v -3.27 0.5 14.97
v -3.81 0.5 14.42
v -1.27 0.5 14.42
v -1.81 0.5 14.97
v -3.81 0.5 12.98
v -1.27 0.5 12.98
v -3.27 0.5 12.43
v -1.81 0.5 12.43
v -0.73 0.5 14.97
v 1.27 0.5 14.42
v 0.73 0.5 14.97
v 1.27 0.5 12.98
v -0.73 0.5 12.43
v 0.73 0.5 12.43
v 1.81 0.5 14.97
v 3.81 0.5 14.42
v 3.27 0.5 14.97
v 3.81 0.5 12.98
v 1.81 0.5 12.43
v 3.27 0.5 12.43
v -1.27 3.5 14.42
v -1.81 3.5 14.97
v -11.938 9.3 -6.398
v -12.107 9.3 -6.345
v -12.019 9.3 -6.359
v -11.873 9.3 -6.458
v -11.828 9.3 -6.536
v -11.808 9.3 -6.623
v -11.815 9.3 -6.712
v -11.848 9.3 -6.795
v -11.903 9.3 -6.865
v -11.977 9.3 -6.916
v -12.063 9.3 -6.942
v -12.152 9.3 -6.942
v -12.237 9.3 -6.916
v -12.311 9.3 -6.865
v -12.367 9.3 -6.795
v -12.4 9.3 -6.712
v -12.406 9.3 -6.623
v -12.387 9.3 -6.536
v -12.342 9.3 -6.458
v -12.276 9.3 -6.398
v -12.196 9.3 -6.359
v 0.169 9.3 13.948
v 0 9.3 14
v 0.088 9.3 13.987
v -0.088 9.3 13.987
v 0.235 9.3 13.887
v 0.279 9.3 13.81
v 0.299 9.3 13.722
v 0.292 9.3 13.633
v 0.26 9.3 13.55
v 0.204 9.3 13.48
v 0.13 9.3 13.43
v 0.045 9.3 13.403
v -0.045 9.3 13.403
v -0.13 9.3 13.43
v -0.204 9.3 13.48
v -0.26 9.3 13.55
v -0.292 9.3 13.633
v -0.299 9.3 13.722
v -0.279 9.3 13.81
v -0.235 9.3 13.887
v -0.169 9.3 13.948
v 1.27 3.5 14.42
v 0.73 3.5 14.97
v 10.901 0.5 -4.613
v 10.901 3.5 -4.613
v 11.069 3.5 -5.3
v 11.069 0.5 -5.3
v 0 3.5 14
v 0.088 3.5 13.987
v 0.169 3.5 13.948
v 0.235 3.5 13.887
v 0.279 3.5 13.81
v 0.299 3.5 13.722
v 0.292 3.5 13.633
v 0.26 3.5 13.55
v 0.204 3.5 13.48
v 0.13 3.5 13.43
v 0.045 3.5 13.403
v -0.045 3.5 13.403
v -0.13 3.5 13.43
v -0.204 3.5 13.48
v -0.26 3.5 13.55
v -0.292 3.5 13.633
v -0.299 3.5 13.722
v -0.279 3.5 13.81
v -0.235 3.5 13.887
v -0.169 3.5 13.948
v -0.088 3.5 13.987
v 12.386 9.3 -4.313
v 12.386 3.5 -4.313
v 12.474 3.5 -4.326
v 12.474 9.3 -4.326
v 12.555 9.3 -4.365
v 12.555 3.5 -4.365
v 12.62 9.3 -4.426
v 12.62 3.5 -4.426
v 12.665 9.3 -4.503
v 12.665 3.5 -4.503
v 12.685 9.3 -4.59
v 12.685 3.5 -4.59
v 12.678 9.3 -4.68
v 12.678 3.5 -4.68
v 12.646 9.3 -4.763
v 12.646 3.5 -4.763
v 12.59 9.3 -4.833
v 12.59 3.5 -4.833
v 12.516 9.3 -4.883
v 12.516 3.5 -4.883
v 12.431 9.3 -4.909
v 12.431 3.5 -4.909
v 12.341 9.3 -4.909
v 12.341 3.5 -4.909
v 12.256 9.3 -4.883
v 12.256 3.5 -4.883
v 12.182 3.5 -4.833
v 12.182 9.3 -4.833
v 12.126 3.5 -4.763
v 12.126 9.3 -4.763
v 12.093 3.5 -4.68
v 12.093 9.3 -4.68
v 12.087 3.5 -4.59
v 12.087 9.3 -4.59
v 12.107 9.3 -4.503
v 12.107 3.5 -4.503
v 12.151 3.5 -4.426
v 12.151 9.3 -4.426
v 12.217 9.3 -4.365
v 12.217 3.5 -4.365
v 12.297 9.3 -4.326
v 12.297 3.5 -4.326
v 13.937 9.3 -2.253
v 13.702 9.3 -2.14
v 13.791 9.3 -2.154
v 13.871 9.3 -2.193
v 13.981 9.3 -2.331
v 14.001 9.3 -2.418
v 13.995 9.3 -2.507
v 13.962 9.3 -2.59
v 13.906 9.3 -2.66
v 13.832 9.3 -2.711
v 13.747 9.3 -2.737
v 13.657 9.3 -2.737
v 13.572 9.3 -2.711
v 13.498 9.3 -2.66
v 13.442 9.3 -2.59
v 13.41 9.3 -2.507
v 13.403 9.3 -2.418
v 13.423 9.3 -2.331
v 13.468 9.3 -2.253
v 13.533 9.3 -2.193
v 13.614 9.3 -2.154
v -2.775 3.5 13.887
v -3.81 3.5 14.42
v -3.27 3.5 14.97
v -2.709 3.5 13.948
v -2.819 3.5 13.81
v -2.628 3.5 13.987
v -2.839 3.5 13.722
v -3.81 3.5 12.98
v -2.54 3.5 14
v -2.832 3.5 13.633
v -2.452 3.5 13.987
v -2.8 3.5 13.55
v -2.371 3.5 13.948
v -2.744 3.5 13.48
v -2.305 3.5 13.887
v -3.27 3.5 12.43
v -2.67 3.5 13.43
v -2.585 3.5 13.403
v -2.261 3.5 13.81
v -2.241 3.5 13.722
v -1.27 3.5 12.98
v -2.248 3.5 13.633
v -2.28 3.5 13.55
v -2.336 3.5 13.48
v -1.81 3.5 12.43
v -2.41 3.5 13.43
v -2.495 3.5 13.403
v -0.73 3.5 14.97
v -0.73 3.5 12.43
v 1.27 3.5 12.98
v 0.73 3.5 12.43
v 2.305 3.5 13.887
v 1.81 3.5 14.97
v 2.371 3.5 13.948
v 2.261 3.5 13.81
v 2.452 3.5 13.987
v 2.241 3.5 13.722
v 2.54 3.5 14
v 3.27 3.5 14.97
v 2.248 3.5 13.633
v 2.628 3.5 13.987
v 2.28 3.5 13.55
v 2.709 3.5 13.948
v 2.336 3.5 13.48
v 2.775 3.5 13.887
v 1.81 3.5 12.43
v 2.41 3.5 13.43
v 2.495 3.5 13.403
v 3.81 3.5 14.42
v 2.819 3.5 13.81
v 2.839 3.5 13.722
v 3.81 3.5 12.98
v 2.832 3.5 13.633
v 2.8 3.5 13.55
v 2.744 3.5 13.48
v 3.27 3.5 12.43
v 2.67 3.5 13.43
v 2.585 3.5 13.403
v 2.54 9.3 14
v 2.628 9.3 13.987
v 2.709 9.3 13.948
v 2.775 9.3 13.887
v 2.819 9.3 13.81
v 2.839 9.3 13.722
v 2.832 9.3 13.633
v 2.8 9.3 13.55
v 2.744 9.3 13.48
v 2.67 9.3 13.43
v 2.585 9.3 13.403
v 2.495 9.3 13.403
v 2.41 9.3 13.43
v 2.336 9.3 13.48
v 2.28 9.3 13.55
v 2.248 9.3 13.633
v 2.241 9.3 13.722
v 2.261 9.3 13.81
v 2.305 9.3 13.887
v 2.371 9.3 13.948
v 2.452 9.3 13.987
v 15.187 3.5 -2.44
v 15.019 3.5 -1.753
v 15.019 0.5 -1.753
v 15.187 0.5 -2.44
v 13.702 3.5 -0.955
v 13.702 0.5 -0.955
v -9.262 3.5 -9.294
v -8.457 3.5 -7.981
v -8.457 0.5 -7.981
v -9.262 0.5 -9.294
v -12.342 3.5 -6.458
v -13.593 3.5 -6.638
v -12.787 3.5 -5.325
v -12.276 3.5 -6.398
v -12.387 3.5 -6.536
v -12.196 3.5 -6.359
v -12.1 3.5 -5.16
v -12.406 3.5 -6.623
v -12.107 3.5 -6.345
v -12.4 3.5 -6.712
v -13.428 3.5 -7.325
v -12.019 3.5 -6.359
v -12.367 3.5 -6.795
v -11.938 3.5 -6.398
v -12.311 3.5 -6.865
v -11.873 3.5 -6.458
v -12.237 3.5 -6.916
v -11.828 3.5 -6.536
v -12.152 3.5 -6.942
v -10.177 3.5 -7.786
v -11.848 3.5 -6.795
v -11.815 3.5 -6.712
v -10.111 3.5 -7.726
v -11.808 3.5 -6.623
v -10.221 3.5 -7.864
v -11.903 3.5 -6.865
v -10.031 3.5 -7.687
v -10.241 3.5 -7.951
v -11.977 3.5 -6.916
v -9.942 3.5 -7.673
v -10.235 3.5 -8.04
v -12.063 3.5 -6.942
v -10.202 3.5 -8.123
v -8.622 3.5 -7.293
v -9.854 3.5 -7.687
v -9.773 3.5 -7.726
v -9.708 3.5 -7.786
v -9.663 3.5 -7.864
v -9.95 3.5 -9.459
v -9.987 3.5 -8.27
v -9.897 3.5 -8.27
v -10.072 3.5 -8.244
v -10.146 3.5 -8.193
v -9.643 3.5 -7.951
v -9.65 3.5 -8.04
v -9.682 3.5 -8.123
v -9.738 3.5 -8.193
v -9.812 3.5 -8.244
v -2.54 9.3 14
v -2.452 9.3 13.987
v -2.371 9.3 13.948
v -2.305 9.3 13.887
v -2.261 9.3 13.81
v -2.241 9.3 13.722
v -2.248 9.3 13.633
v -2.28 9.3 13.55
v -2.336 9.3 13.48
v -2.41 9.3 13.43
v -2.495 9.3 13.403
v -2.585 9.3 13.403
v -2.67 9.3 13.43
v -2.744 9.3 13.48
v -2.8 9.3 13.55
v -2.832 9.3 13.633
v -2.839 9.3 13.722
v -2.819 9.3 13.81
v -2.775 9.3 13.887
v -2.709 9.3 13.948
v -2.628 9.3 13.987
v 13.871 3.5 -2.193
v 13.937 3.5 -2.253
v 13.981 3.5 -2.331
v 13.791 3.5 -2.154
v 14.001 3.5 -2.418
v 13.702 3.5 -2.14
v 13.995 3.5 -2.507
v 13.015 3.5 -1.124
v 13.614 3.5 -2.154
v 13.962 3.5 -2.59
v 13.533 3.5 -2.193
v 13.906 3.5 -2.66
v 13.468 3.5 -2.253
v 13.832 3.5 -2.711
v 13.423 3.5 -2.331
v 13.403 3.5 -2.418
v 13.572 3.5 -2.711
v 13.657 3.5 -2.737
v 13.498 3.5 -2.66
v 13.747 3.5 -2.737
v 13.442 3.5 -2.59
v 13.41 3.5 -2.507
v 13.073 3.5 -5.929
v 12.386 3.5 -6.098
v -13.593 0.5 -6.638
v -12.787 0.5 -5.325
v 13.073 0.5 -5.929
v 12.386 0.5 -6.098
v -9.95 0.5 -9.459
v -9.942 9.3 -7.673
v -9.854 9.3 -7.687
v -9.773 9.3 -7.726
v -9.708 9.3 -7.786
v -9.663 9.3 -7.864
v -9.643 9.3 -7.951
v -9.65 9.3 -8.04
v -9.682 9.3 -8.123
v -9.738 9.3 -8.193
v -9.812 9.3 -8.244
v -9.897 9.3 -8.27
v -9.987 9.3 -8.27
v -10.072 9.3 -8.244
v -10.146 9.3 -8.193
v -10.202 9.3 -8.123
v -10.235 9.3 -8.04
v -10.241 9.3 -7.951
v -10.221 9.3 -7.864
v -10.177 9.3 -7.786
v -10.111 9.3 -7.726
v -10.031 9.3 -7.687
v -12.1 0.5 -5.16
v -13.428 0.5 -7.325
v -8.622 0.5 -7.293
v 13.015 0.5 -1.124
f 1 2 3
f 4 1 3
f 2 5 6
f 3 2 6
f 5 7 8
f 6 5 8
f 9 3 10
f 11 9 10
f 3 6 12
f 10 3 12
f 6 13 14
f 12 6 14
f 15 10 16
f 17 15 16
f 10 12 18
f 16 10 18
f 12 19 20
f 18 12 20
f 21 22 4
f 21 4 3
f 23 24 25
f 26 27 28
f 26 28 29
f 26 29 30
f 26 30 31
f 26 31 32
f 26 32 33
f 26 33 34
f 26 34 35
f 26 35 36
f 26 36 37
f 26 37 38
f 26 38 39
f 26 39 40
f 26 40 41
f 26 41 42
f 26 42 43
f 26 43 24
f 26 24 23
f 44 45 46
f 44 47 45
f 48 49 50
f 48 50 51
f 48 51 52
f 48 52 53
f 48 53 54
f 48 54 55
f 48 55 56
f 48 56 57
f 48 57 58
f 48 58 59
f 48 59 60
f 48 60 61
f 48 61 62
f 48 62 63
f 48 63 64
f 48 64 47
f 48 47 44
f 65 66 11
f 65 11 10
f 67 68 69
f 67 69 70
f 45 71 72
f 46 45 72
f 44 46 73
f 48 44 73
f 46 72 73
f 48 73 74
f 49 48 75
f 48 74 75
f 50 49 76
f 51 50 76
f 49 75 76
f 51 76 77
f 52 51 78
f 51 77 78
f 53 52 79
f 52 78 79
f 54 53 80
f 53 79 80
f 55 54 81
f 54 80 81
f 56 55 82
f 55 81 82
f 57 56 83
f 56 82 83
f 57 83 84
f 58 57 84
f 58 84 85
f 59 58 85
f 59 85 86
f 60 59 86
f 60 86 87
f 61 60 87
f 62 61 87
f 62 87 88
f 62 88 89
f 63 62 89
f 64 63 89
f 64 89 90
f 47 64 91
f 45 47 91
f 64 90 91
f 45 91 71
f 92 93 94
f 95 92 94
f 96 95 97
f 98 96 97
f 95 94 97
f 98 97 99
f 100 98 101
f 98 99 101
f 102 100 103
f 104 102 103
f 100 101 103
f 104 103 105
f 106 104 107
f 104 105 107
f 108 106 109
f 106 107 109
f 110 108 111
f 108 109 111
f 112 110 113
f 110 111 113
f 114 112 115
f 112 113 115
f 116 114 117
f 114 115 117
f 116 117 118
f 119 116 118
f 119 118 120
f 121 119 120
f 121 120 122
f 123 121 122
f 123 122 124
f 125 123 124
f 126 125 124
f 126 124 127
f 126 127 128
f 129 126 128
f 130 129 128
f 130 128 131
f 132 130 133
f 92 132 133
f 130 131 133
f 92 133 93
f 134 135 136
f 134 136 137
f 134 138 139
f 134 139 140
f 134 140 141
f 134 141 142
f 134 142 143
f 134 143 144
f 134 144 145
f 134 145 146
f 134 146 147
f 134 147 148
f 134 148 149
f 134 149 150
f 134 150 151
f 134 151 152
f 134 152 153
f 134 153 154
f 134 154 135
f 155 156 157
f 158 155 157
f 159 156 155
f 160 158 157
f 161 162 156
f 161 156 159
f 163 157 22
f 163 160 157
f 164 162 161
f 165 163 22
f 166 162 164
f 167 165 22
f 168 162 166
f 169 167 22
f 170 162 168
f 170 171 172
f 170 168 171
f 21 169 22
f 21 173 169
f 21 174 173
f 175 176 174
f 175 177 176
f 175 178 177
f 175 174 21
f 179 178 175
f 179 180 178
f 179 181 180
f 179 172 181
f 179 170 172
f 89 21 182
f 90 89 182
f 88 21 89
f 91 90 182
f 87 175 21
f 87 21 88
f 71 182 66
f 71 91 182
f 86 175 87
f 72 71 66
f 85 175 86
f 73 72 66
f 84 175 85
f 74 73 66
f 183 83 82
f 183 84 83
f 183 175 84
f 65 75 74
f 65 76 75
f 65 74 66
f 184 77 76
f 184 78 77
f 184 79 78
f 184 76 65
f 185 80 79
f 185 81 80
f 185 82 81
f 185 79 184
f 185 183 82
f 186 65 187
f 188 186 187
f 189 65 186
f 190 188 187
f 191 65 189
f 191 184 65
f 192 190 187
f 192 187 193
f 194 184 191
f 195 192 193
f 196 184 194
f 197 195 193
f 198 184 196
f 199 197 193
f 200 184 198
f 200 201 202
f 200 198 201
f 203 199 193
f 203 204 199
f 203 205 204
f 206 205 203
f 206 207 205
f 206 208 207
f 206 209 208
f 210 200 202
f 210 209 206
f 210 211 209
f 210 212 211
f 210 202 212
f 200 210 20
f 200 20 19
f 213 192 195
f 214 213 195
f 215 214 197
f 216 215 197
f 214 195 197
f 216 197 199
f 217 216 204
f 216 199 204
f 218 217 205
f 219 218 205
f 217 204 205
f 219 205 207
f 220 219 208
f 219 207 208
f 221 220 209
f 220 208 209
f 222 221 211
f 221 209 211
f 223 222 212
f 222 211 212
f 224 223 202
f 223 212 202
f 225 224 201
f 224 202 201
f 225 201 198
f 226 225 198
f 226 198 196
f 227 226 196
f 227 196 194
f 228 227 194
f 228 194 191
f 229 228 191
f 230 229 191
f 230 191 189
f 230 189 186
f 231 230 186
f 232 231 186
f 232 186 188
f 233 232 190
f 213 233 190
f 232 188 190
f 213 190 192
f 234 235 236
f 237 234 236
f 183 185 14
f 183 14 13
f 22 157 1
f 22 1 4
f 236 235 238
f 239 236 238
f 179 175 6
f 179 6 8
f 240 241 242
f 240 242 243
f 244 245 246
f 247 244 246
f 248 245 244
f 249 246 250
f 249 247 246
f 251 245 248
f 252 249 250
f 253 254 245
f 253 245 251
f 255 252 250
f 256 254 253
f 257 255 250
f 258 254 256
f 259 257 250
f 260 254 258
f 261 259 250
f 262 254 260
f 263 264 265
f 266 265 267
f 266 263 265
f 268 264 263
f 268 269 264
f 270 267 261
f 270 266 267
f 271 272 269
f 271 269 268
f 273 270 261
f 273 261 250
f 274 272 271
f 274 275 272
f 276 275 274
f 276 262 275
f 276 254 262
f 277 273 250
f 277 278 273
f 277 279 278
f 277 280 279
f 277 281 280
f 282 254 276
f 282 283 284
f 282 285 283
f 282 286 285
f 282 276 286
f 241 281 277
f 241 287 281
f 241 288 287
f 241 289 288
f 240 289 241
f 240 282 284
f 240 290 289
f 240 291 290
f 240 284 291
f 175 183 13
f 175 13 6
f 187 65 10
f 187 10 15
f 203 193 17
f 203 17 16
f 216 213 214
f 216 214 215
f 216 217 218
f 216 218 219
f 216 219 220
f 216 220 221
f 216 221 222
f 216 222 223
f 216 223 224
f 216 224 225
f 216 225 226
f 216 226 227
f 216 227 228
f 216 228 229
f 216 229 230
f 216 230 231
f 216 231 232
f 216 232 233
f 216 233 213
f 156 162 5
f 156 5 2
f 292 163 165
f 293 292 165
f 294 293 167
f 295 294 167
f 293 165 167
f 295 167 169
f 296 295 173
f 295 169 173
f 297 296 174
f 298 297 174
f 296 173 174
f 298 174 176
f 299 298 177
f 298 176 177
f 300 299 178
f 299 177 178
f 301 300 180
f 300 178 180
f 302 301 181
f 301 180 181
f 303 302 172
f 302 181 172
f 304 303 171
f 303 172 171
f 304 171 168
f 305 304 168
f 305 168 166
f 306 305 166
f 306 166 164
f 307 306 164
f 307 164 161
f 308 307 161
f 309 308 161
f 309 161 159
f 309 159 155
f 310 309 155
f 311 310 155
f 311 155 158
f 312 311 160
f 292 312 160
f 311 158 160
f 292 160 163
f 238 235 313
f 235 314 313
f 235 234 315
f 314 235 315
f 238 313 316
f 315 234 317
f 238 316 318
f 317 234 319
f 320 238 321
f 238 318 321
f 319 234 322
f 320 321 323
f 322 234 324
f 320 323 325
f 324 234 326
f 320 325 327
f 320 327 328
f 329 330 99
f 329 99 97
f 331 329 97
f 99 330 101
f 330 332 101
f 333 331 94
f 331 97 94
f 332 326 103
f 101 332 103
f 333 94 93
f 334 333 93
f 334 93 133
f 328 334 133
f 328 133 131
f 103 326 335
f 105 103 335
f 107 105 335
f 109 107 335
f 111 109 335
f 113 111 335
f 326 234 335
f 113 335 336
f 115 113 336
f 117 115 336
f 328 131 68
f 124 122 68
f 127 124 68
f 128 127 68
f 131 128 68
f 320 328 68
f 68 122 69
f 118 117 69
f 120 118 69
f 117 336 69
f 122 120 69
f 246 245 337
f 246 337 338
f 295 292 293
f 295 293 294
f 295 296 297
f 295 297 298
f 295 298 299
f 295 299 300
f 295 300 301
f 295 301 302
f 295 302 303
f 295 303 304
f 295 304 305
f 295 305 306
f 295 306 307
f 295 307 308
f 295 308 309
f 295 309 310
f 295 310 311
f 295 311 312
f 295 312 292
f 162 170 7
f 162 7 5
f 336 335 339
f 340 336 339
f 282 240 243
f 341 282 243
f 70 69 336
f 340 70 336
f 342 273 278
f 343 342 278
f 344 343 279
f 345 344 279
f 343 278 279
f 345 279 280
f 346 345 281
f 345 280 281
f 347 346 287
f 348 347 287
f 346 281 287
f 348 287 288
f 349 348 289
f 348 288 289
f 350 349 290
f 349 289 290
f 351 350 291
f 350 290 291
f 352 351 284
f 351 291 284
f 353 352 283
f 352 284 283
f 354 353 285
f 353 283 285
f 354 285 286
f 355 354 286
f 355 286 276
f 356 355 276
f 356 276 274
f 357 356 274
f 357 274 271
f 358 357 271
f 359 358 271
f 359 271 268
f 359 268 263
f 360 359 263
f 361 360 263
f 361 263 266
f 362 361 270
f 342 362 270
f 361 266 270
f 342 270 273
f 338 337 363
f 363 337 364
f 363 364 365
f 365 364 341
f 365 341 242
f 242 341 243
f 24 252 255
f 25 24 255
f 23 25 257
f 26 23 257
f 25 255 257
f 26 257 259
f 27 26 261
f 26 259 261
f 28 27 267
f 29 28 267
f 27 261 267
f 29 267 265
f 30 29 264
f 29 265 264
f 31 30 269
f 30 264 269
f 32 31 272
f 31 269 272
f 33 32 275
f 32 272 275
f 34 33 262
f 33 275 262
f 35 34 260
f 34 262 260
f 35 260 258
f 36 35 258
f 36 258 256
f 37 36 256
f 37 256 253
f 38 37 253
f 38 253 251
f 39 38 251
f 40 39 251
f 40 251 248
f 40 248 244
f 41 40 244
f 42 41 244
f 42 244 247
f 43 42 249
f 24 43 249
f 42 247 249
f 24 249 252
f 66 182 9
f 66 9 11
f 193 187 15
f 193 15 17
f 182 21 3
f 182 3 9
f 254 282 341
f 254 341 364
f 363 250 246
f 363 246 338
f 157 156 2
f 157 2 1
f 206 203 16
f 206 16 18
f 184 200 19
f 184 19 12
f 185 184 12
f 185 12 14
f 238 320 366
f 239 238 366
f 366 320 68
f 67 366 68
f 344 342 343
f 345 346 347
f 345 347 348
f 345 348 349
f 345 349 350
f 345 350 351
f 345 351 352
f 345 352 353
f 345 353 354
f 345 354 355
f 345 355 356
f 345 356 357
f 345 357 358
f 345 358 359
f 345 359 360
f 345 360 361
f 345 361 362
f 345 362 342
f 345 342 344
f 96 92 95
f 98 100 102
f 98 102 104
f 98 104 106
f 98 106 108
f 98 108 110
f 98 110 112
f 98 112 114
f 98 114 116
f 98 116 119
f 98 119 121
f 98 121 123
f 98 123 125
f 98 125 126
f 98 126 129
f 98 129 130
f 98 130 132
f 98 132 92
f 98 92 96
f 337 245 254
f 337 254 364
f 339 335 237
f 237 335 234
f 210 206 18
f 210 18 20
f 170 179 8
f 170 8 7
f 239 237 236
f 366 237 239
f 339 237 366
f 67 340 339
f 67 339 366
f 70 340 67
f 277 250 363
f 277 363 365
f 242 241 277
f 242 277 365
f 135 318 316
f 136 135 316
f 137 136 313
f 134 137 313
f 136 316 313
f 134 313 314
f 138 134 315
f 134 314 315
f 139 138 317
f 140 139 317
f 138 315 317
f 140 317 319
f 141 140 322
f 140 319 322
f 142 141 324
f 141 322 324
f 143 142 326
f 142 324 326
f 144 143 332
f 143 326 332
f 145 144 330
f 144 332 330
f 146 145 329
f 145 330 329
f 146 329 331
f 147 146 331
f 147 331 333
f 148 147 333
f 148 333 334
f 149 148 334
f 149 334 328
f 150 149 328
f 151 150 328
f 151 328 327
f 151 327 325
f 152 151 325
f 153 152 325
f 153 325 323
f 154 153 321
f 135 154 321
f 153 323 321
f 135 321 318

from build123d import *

# Parameters (mm, degrees)
EXTRUDE_1_DEPTH   = 3
EXTRUDE_1_2_DEPTH = 3
EXTRUDE_1_3_DEPTH = 3
CHAMFER_1_SIZE    = 0.5
CHAMFER_2_SIZE    = 0.5
SKETCH_2_R        = 0.3
EXTRUDE_2_DEPTH   = 5.8


with BuildPart() as part:
    # 草图1 → 凸台-拉伸1 (new body)
    with BuildSketch(Plane(origin=(0, 3.5, 0), x_dir=(1, 0, 0), z_dir=(0, 1, 0))):
        Polygon((-3.81, -14.42), (-3.27, -14.97), (-1.81, -14.97), (-1.27, -14.42), (-0.73, -14.97), (0.73, -14.97), (1.27, -14.42), (1.81, -14.97), (3.27, -14.97), (3.81, -14.42), (3.81, -12.98), (3.27, -12.43), (1.81, -12.43), (1.27, -12.98), (0.73, -12.43), (-0.73, -12.43), (-1.27, -12.98), (-1.81, -12.43), (-3.27, -12.43), (-3.81, -12.98), align=None)
    extrude(amount=-EXTRUDE_1_DEPTH)



with BuildPart() as body_2:
    # 草图1 → Extrude 1 2 (new body)
    with BuildSketch(Plane(origin=(0, 3.5, 0), x_dir=(1, 0, 0), z_dir=(0, 1, 0))):
        Polygon((-9.52353721, 9.720015629), (-13.853921534, 7.064046576), (-12.525937008, 4.898854414), (-8.195552684, 7.554823466), align=None)
    extrude(amount=-EXTRUDE_1_2_DEPTH)

    # 倒角1
    chamfer_1_edges = [body_2.edges().sort_by_distance(p)[0] for p in [
        (-13.853921534, 2, -7.064046576),
        (-12.525937008, 2, -4.898854414),
        (-8.195552684, 2, -7.554823466),
        (-9.52353721, 2, -9.720015629),
    ]]
    chamfer(chamfer_1_edges, length=CHAMFER_1_SIZE)


with BuildPart() as body_3:
    # 草图1 → Extrude 1 3 (new body)
    with BuildSketch(Plane(origin=(0, 3.5, 0), x_dir=(1, 0, 0), z_dir=(0, 1, 0))):
        Polygon((10.641496985, 5.04080908), (12.813807939, 6.357116461), (15.446422701, 2.012494554), (13.274111747, 0.696187173), align=None)
    extrude(amount=-EXTRUDE_1_3_DEPTH)

    # 倒角2
    chamfer_2_edges = [body_3.edges().sort_by_distance(p)[0] for p in [
        (10.641496985, 2, -5.04080908),
        (13.274111747, 2, -0.696187173),
        (15.446422701, 2, -2.012494554),
        (12.813807939, 2, -6.357116461),
    ]]
    chamfer(chamfer_2_edges, length=CHAMFER_2_SIZE)


with BuildPart() as part_1:
    add(part.part)

    add(body_2.part)  # 凸台-拉伸2 merges body 2

    add(body_3.part)  # 凸台-拉伸2 merges body 3
    # 草图2 → 凸台-拉伸2 (add)
    with BuildSketch(Plane(origin=(0, 3.5, 0), x_dir=(1, 0, 0), z_dir=(0, 1, 0))):
        with Locations(Location((-12.10733319, 6.645442758, 0), (0, 0, 270))):
            Circle(SKETCH_2_R)
        with Locations(Location((-9.942141028, 7.973427284, 0), (0, 0, 270))):
            Circle(SKETCH_2_R)
        with Locations(Location((12.385806153, 4.612807294, 0), (0, 0, 270))):
            Circle(SKETCH_2_R)
        with Locations(Location((13.702113533, 2.44049634, 0), (0, 0, 270))):
            Circle(SKETCH_2_R)
        with Locations(Location((0, -13.7, 0), (0, 0, 270))):
            Circle(SKETCH_2_R)
        with Locations(Location((-2.54, -13.7, 0), (0, 0, 270))):
            Circle(SKETCH_2_R)
        with Locations(Location((2.54, -13.7, 0), (0, 0, 270))):
            Circle(SKETCH_2_R)
    extrude(amount=EXTRUDE_2_DEPTH)


solid = part_1.part
